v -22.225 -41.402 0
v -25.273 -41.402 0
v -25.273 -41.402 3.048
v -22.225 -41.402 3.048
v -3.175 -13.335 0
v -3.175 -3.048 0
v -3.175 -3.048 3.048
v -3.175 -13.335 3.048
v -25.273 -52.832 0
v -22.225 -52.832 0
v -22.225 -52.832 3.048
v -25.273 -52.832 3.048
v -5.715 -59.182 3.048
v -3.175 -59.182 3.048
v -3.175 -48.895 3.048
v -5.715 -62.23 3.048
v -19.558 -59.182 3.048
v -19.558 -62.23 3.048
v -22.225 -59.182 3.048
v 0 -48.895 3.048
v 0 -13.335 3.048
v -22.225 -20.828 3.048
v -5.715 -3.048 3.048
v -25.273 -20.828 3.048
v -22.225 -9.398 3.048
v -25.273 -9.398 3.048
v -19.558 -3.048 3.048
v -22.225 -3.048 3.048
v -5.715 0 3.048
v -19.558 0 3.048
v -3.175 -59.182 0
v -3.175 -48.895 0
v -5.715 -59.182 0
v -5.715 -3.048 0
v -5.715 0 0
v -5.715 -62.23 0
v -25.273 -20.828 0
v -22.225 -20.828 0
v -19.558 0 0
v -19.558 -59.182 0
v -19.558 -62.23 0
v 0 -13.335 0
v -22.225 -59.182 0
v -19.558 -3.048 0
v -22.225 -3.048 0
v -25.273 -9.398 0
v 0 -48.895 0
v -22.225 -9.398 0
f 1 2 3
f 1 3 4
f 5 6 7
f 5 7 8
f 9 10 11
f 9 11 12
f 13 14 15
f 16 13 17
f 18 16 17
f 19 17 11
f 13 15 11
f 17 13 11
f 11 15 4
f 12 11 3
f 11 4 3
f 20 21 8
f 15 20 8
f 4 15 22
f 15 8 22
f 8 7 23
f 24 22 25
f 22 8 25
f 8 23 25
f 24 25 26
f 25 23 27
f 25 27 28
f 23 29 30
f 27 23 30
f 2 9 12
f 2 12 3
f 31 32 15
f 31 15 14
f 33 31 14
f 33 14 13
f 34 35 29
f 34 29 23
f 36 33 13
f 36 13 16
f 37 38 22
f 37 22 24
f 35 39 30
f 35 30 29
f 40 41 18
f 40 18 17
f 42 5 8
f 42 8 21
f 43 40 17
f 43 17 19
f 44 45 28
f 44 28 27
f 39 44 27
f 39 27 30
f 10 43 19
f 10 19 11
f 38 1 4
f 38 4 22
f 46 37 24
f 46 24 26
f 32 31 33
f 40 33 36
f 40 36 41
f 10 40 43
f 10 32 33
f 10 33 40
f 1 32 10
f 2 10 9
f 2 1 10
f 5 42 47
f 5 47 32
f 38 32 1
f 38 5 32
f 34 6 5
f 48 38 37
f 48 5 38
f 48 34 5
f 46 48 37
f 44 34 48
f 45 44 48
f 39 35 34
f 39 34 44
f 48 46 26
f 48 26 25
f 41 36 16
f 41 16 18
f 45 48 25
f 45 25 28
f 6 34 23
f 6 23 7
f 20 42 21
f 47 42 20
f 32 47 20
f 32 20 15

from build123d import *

# Parameters (mm, degrees)
BOSS_EXTRUDE1_DEPTH = 3.048


with BuildPart() as part:
    # Sketch1 → Boss-Extrude1 (new body)
    with BuildSketch(Plane.XY):
        Polygon((-22.225, -3.048), (-19.558, -3.048), (-19.558, 0), (-5.715, 0), (-5.715, -3.048), (-3.175, -3.048), (-3.175, -13.335), (0, -13.335), (0, -48.895), (-3.175, -48.895), (-3.175, -59.182), (-5.715, -59.182), (-5.715, -62.23), (-19.558, -62.23), (-19.558, -59.182), (-22.225, -59.182), (-22.225, -52.832), (-25.273, -52.832), (-25.273, -41.402), (-22.225, -41.402), (-22.225, -20.828), (-25.273, -20.828), (-25.273, -9.398), (-22.225, -9.398), align=None)
    extrude(amount=BOSS_EXTRUDE1_DEPTH)


solid = part.part
